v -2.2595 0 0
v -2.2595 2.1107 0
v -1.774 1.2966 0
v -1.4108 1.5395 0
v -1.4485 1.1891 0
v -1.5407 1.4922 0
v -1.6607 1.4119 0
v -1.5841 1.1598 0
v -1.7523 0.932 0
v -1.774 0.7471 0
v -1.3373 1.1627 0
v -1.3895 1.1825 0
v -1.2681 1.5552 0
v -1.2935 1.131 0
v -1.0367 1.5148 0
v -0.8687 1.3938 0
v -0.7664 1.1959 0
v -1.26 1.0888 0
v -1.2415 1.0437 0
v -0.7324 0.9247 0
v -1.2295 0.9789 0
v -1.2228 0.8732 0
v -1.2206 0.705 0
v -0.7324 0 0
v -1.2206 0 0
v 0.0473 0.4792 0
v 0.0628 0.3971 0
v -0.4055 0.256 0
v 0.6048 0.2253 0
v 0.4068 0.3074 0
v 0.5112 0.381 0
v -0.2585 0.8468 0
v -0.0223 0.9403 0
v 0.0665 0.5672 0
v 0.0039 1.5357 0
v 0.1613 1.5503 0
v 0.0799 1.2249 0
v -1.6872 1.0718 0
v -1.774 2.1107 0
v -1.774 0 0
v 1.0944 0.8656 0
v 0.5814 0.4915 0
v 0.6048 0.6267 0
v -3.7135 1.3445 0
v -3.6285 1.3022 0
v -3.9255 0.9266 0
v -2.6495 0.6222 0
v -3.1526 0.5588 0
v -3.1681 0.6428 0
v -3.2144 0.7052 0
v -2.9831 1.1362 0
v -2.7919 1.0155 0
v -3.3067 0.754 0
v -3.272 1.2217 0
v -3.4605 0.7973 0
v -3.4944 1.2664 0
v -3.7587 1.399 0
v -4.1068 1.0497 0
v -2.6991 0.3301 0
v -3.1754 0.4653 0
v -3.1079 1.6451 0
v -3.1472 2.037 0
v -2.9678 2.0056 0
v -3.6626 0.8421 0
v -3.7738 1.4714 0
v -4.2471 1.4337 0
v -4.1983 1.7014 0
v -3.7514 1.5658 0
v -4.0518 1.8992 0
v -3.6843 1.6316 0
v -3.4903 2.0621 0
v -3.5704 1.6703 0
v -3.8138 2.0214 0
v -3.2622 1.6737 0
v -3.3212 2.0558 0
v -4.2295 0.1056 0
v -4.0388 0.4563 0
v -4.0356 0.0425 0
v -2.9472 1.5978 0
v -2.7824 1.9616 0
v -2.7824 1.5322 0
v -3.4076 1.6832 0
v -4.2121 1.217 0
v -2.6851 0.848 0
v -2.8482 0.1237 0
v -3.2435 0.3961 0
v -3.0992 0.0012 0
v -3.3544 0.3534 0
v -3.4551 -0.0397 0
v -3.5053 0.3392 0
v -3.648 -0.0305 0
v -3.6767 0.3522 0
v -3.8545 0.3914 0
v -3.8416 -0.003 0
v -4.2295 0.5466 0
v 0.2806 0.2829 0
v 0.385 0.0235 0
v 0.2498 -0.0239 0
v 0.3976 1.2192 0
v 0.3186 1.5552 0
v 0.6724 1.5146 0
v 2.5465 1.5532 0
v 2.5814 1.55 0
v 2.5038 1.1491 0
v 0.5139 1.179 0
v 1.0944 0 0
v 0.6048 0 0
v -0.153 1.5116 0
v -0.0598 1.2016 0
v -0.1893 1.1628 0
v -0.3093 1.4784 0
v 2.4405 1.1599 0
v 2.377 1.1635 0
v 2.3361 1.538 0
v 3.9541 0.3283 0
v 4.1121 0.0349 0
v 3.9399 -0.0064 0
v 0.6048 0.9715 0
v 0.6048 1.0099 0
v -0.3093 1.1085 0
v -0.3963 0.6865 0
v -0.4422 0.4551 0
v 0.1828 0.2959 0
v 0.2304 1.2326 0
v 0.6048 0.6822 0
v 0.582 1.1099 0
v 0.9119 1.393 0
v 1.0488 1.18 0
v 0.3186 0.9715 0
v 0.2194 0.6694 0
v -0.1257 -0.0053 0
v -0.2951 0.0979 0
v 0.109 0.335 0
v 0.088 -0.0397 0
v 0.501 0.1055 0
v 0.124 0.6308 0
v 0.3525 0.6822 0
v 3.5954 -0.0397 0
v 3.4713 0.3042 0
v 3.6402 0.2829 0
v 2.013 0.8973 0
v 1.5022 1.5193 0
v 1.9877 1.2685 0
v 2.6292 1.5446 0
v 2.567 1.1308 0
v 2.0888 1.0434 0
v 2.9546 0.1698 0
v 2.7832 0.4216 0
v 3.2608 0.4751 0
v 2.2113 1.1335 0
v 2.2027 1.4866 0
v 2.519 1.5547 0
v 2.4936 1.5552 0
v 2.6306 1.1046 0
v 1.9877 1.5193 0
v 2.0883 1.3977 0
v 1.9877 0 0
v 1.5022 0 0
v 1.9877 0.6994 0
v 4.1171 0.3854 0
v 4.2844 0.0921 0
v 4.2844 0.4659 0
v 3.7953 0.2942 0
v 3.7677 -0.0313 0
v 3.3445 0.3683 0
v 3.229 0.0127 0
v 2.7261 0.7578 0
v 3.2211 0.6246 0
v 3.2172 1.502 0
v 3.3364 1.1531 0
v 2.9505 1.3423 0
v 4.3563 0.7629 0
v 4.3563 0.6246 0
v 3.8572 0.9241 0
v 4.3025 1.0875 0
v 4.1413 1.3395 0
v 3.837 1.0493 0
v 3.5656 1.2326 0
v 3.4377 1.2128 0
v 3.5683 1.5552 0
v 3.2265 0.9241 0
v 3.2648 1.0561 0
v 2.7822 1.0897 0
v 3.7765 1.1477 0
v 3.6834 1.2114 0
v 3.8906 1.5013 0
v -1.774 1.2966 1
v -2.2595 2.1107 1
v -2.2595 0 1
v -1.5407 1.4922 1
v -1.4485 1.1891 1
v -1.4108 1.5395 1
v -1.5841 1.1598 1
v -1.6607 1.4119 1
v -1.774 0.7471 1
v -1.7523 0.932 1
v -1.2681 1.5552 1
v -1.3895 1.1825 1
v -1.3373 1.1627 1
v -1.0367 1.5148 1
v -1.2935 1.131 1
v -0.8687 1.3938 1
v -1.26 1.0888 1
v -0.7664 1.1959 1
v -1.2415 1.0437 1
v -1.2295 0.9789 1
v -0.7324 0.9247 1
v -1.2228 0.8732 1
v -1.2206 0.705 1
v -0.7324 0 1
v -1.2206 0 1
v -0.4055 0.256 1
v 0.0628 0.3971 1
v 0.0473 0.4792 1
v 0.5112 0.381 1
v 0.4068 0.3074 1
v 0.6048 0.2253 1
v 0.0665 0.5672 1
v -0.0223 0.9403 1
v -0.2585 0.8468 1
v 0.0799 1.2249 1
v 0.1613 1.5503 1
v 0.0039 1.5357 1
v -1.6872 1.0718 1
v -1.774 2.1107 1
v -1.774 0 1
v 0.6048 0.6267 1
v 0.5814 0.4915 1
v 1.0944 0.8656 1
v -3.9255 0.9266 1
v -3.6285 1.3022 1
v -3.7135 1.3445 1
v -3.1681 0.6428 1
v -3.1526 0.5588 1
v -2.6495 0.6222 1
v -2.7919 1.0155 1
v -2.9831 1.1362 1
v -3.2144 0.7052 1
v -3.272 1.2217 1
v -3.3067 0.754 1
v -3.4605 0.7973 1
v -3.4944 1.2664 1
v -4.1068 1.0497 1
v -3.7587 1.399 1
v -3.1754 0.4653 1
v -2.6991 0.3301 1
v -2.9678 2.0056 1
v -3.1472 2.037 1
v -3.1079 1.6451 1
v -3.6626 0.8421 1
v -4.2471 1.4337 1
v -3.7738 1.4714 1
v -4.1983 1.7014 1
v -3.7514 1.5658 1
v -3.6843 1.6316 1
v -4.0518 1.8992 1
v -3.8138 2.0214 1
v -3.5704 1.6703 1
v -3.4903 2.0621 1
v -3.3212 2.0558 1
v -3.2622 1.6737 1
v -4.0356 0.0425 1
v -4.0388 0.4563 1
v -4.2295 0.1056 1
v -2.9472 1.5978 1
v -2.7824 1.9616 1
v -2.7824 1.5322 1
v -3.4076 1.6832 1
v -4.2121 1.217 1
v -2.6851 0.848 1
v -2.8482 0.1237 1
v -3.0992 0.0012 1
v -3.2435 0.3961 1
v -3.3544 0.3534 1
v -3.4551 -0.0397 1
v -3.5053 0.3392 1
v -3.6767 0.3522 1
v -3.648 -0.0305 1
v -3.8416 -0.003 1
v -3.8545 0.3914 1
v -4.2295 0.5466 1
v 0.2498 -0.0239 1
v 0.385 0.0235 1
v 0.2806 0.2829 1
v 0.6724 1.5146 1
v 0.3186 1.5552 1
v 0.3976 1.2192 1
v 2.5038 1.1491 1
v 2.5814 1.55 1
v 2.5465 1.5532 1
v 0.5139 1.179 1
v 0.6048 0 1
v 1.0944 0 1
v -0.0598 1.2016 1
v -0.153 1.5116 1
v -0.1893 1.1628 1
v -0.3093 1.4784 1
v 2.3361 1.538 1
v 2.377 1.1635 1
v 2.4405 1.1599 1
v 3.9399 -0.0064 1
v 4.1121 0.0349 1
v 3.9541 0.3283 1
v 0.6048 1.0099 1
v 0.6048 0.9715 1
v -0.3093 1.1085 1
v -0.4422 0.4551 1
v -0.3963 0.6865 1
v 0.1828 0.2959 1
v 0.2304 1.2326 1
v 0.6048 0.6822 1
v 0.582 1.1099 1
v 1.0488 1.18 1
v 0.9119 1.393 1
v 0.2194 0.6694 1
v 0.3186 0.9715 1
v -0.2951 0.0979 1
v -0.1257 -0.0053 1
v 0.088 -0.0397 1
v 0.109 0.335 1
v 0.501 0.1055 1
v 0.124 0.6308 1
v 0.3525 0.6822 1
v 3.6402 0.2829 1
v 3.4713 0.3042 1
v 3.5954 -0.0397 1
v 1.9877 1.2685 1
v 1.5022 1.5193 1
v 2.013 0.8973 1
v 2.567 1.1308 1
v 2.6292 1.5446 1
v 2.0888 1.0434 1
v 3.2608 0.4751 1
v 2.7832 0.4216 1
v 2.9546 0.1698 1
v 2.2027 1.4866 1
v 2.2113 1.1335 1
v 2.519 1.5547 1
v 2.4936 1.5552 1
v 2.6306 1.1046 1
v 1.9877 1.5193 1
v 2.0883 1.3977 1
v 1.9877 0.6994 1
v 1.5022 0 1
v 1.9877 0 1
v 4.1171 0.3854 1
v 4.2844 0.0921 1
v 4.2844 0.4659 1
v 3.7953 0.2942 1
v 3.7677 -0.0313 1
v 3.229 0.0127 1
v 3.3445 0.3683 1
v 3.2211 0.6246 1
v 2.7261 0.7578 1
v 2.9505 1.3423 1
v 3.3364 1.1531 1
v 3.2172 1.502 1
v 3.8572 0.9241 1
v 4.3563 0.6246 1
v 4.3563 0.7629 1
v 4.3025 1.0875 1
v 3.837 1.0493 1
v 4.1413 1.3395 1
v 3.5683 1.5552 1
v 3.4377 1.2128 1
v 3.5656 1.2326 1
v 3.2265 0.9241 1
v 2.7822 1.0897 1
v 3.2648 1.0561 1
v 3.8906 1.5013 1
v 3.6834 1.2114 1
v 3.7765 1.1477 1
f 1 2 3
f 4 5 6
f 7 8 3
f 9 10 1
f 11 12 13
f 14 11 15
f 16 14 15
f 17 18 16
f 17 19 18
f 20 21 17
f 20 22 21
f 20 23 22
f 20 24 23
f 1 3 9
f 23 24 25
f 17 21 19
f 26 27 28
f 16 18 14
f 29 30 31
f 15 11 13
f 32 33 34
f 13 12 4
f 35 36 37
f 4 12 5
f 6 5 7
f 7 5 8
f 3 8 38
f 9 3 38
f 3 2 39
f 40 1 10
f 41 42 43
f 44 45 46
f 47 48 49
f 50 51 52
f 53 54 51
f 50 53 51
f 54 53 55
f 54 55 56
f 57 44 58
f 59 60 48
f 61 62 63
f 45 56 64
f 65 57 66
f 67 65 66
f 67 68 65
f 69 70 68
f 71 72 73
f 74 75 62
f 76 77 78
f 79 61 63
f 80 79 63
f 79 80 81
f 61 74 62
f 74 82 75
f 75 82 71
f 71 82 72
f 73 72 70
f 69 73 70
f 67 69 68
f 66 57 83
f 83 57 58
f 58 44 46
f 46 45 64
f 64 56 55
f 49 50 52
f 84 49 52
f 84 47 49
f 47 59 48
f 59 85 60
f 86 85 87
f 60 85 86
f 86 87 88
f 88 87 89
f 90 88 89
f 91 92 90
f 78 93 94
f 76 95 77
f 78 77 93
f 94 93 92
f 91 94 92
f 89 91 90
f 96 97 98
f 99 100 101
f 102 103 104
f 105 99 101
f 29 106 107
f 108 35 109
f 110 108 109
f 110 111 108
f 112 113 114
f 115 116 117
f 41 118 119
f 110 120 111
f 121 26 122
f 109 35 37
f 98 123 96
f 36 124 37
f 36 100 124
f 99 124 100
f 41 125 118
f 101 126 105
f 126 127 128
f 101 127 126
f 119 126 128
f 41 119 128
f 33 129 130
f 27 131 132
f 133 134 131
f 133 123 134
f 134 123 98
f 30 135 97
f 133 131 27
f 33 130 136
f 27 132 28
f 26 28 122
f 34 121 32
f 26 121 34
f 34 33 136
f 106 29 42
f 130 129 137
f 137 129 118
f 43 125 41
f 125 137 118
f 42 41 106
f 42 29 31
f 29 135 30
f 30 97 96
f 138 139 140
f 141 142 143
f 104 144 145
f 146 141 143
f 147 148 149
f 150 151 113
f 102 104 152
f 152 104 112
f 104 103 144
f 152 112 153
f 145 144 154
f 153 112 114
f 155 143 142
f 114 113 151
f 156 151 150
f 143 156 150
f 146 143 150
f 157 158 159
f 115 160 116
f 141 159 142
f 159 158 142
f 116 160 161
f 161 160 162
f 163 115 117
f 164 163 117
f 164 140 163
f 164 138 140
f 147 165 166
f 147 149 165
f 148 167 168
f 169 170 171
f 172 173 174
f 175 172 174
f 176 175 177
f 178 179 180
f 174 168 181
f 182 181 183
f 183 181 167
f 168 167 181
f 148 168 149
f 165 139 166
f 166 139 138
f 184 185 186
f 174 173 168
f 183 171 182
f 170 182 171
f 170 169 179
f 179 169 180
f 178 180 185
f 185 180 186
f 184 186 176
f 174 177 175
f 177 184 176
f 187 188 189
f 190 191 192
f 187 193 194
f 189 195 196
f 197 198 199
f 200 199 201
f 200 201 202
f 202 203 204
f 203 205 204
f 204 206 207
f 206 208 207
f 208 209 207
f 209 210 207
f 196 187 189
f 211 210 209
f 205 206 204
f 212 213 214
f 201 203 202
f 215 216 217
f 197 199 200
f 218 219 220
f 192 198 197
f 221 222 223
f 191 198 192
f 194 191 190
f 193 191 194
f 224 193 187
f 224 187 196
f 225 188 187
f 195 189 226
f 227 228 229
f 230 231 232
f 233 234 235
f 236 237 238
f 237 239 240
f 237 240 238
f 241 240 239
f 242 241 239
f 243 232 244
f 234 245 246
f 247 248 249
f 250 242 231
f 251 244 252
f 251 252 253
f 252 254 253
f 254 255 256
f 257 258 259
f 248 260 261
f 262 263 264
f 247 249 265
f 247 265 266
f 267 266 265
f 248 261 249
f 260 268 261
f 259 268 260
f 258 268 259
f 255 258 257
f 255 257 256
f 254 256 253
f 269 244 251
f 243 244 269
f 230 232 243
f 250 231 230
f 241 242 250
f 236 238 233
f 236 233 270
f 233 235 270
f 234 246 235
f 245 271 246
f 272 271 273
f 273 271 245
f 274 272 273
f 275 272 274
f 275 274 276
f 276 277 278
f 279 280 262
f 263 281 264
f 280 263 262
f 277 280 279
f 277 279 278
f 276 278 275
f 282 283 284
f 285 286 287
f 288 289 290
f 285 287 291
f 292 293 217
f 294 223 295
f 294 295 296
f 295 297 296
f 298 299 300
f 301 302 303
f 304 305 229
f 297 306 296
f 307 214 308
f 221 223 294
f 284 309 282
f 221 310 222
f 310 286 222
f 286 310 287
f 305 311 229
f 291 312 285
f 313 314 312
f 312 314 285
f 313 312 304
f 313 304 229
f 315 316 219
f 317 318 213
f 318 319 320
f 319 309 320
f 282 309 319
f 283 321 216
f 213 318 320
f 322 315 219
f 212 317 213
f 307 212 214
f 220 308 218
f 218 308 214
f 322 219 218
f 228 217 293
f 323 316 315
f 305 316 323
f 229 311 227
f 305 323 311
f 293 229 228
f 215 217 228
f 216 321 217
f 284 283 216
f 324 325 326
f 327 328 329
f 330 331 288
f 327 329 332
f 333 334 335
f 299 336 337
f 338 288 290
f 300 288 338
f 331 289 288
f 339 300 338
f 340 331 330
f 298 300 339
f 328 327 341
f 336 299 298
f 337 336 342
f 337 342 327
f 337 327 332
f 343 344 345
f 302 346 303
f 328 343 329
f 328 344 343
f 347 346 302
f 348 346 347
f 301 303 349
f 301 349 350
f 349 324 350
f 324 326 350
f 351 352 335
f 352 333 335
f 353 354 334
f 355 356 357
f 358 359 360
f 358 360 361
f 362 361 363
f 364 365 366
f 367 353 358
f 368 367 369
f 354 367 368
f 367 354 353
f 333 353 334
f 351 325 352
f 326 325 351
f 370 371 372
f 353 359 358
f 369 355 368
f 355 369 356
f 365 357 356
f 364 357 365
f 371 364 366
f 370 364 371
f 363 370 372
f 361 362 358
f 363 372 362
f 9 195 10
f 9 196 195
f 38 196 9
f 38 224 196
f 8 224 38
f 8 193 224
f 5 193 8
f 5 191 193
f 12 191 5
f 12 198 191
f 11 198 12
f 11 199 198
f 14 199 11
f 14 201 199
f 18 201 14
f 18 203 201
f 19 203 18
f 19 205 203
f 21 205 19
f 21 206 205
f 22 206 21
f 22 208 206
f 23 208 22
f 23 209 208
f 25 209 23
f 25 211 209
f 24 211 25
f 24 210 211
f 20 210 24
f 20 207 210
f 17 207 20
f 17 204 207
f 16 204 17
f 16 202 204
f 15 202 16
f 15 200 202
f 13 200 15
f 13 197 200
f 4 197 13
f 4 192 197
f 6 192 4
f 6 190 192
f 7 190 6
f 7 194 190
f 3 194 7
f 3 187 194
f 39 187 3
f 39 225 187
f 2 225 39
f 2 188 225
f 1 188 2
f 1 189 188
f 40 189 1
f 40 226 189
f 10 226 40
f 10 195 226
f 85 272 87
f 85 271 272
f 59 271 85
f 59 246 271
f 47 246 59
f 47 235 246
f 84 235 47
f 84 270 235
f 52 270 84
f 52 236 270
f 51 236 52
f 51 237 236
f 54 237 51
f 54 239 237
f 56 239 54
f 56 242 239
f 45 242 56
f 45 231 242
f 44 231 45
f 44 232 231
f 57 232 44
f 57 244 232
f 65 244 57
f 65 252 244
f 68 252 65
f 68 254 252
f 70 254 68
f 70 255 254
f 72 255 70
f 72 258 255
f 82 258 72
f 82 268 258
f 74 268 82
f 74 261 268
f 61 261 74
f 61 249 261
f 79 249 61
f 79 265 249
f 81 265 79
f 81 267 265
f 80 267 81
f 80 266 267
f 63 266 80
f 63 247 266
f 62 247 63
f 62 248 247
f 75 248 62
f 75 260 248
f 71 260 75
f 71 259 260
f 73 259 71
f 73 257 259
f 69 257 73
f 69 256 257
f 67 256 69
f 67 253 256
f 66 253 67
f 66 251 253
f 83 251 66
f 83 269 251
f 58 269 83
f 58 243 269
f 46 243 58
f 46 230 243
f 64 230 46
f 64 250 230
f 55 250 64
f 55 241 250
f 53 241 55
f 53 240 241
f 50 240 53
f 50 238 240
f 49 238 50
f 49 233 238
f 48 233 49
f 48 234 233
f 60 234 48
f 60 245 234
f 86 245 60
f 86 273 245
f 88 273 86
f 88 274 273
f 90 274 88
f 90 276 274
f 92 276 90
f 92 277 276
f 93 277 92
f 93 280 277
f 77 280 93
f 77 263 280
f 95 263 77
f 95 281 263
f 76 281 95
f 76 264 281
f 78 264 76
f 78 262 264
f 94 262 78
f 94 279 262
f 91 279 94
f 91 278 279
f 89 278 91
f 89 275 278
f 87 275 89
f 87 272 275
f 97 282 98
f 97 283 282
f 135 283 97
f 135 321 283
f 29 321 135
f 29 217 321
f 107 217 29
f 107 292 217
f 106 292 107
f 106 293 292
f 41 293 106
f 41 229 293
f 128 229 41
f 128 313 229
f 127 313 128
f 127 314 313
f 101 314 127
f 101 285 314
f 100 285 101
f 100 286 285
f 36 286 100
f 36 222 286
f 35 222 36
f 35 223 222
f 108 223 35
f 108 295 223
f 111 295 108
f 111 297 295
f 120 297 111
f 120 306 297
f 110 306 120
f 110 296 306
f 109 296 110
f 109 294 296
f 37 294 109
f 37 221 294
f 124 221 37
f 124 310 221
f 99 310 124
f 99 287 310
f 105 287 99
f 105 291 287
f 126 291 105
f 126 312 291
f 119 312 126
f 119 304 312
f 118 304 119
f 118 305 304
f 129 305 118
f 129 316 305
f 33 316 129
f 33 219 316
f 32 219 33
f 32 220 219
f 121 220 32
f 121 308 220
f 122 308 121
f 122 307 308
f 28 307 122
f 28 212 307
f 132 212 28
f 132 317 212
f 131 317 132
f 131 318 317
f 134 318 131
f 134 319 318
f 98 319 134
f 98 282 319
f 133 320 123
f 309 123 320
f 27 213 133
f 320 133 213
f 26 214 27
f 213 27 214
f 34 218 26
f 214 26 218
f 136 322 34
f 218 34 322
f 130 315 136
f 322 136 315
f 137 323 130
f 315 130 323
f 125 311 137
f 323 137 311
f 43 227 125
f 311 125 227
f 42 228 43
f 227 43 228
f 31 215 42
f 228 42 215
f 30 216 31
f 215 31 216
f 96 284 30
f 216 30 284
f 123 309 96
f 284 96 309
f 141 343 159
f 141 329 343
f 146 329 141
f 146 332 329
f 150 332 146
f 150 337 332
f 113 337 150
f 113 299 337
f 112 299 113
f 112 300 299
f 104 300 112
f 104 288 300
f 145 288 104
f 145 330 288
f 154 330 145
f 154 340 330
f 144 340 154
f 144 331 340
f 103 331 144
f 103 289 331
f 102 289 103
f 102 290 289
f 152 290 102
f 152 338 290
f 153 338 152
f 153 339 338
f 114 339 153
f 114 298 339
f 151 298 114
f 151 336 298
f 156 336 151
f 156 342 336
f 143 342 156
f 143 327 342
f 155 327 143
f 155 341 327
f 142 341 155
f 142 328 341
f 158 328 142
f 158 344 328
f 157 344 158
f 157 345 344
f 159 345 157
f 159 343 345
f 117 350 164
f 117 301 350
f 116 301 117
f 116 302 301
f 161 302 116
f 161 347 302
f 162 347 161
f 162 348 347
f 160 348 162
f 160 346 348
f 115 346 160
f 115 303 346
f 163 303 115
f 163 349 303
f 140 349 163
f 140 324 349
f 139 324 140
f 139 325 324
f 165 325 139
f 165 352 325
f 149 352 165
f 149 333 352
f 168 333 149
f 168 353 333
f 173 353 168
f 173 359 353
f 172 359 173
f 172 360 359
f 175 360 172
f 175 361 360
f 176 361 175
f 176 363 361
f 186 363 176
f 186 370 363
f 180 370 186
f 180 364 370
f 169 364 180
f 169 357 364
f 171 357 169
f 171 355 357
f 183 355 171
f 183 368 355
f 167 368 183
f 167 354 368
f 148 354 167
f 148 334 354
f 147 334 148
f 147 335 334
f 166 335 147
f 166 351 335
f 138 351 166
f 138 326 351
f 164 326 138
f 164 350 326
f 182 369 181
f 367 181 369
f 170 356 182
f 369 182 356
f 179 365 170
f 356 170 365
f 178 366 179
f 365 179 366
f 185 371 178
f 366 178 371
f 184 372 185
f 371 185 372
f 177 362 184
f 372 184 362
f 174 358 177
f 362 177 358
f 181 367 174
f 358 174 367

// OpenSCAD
linear_extrude(1)
text("Share", font="Verdana:style=Bold", size=2, halign="center");
